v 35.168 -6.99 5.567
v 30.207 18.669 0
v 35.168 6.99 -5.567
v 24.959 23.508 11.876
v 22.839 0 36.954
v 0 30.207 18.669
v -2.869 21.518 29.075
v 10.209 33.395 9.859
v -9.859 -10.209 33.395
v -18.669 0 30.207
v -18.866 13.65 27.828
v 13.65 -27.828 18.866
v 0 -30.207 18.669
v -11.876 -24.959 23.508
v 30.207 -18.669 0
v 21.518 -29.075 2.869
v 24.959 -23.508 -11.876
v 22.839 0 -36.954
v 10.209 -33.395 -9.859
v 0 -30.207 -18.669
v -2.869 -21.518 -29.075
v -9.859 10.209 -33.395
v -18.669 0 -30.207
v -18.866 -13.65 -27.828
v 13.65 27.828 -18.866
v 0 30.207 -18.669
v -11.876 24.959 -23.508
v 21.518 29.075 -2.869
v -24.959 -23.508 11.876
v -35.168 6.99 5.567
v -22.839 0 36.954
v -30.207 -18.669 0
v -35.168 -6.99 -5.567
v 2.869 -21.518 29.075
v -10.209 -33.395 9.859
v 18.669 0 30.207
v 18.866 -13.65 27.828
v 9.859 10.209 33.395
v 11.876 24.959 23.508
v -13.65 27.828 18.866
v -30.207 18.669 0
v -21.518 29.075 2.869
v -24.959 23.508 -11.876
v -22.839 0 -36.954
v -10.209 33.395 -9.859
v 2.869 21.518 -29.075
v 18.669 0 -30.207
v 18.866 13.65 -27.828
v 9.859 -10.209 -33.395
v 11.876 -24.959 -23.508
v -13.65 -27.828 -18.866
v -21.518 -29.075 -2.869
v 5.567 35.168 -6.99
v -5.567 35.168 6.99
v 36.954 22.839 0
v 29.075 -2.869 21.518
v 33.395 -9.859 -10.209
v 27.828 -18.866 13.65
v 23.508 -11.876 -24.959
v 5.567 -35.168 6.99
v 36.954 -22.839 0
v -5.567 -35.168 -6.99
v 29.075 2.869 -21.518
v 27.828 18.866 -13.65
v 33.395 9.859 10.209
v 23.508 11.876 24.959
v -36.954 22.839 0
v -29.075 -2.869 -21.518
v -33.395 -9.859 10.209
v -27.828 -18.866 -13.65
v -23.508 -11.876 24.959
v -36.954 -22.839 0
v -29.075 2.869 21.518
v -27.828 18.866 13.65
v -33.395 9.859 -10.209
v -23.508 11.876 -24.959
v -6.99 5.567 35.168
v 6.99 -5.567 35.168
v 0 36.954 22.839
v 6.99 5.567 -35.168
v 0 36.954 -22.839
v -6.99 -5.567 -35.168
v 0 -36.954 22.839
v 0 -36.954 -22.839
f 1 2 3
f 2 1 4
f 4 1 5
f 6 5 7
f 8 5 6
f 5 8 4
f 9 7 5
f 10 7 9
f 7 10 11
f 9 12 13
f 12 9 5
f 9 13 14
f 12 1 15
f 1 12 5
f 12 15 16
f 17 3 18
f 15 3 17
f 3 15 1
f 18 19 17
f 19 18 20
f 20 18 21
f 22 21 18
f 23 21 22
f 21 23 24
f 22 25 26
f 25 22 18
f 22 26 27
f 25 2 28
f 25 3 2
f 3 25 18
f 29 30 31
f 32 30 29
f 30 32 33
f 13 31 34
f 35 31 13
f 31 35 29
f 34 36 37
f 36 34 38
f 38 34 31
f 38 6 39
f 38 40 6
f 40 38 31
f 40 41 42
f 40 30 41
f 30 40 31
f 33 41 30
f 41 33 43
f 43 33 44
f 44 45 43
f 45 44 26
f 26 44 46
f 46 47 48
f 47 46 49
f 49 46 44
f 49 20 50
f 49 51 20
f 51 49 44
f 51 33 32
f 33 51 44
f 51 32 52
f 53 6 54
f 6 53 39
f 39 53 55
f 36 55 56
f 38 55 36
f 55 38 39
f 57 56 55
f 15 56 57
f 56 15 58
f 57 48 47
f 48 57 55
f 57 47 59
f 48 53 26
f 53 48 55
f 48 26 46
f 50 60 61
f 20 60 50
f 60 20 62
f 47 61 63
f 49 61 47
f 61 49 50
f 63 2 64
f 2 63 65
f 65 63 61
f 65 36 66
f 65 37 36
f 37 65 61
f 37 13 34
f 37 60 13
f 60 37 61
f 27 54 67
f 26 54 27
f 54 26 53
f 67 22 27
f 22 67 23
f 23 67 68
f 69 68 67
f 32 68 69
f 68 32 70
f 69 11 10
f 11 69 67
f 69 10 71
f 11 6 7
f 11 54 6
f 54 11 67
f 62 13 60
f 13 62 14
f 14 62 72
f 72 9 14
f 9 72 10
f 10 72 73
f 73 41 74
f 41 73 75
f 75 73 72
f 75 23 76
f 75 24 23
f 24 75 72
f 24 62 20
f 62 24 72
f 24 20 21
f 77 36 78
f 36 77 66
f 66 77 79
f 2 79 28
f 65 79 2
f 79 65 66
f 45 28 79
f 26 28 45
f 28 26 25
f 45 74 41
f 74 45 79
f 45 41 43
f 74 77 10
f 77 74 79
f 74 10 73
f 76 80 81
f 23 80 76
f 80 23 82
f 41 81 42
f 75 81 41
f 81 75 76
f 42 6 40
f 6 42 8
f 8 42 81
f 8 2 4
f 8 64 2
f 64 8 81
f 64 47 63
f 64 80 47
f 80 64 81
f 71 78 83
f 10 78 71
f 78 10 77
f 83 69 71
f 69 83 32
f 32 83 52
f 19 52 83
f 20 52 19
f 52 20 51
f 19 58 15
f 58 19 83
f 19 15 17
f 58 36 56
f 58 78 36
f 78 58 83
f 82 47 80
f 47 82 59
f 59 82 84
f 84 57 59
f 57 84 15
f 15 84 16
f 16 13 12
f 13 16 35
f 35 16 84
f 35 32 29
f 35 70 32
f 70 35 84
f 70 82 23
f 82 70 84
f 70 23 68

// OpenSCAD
// Medial Pentagonal Hexecontahedron
//   coords via: http://dmccooey.com/polyhedra/MedialPentagonalHexecontahedron.html
//
scaling_factor = 30;

C0  = 0.0956375228054126600288251856007;
C1  = 0.185557856078737208916498067410;
C2  = 0.232983484058011057773884196064;
C3  = 0.3286210068634237178027093816646;
C4  = 0.340302618577738088855453915730;
C5  = 0.395876440820370748493308922286;
C6  = 0.4549836805139589684034395850047;
C7  = 0.622299338042328798044313589880;
C8  = 0.62885992487838180626719311834997;
C9  = 0.717277814600969258425288142552;
C10 = 0.76128814508384772869302314304499;
C11 = 0.783604687377382686206148966669;
C12 = 0.831958876537190137973273811827;
C13 = 0.927596399342602798002098997427;
C14 = 0.969162543456119895122647034080;
C15 = 1.00690148012904844554595434173;
C16 = 1.11315425542134000691859706484;
C17 = 1.17226149511492822682872772756;
C18 = 1.23179009397802679283951773532;

vertices = [
  [ C10,  0.0,  C18], [ C10,  0.0, -C18], [-C10,  0.0,  C18], [-C10,  0.0, -C18],
  [ C18,  C10,  0.0], [ C18, -C10,  0.0], [-C18,  C10,  0.0], [-C18, -C10,  0.0],
  [ 0.0,  C18,  C10], [ 0.0,  C18, -C10], [ 0.0, -C18,  C10], [ 0.0, -C18, -C10],
  [  C2,  -C1,  C17], [  C2,   C1, -C17], [ -C2,   C1,  C17], [ -C2,  -C1, -C17],
  [ C17,  -C2,   C1], [ C17,   C2,  -C1], [-C17,   C2,   C1], [-C17,  -C2,  -C1],
  [  C1, -C17,   C2], [  C1,  C17,  -C2], [ -C1,  C17,   C2], [ -C1, -C17,  -C2],
  [  C3,   C4,  C16], [  C3,  -C4, -C16], [ -C3,  -C4,  C16], [ -C3,   C4, -C16],
  [ C16,   C3,   C4], [ C16,  -C3,  -C4], [-C16,  -C3,   C4], [-C16,   C3,  -C4],
  [  C4,  C16,   C3], [  C4, -C16,  -C3], [ -C4, -C16,   C3], [ -C4,  C16,  -C3],
  [  C7,  0.0,  C15], [  C7,  0.0, -C15], [ -C7,  0.0,  C15], [ -C7,  0.0, -C15],
  [ C15,   C7,  0.0], [ C15,  -C7,  0.0], [-C15,   C7,  0.0], [-C15,  -C7,  0.0],
  [ 0.0,  C15,   C7], [ 0.0,  C15,  -C7], [ 0.0, -C15,   C7], [ 0.0, -C15,  -C7],
  [  C0,  -C9,  C14], [  C0,   C9, -C14], [ -C0,   C9,  C14], [ -C0,  -C9, -C14],
  [ C14,  -C0,   C9], [ C14,   C0,  -C9], [-C14,   C0,   C9], [-C14,  -C0,  -C9],
  [  C9, -C14,   C0], [  C9,  C14,  -C0], [ -C9,  C14,   C0], [ -C9, -C14,  -C0],
  [  C8,  -C6,  C13], [  C8,   C6, -C13], [ -C8,   C6,  C13], [ -C8,  -C6, -C13],
  [ C13,  -C8,   C6], [ C13,   C8,  -C6], [-C13,   C8,   C6], [-C13,  -C8,  -C6],
  [  C6, -C13,   C8], [  C6,  C13,  -C8], [ -C6,  C13,   C8], [ -C6, -C13,  -C8],
  [ C11,   C5,  C12], [ C11,  -C5, -C12], [-C11,  -C5,  C12], [-C11,   C5, -C12],
  [ C12,  C11,   C5], [ C12, -C11,  -C5], [-C12, -C11,   C5], [-C12,  C11,  -C5],
  [  C5,  C12,  C11], [  C5, -C12, -C11], [ -C5, -C12,  C11], [ -C5,  C12, -C11]
];

faces = [
  [ 0, 16, 17, 40, 76], [ 0, 76, 32, 44, 50], [ 0, 50, 62, 38, 26], [ 0, 26, 82, 46, 68], [ 0, 68, 56, 41, 16],
  [ 1, 17, 16, 41, 77], [ 1, 77, 33, 47, 51], [ 1, 51, 63, 39, 27], [ 1, 27, 83, 45, 69], [ 1, 69, 57, 40, 17],
  [ 2, 18, 19, 43, 78], [ 2, 78, 34, 46, 48], [ 2, 48, 60, 36, 24], [ 2, 24, 80, 44, 70], [ 2, 70, 58, 42, 18],
  [ 3, 19, 18, 42, 79], [ 3, 79, 35, 45, 49], [ 3, 49, 61, 37, 25], [ 3, 25, 81, 47, 71], [ 3, 71, 59, 43, 19],
  [ 4, 21, 22, 44, 80], [ 4, 80, 24, 36, 52], [ 4, 52, 64, 41, 29], [ 4, 29, 73, 37, 61], [ 4, 61, 49, 45, 21],
  [ 5, 20, 23, 47, 81], [ 5, 81, 25, 37, 53], [ 5, 53, 65, 40, 28], [ 5, 28, 72, 36, 60], [ 5, 60, 48, 46, 20],
  [ 6, 22, 21, 45, 83], [ 6, 83, 27, 39, 55], [ 6, 55, 67, 43, 30], [ 6, 30, 74, 38, 62], [ 6, 62, 50, 44, 22],
  [ 7, 23, 20, 46, 82], [ 7, 82, 26, 38, 54], [ 7, 54, 66, 42, 31], [ 7, 31, 75, 39, 63], [ 7, 63, 51, 47, 23],
  [ 8, 14, 12, 36, 72], [ 8, 72, 28, 40, 57], [ 8, 57, 69, 45, 35], [ 8, 35, 79, 42, 66], [ 8, 66, 54, 38, 14],
  [ 9, 13, 15, 39, 75], [ 9, 75, 31, 42, 58], [ 9, 58, 70, 44, 32], [ 9, 32, 76, 40, 65], [ 9, 65, 53, 37, 13],
  [10, 12, 14, 38, 74], [10, 74, 30, 43, 59], [10, 59, 71, 47, 33], [10, 33, 77, 41, 64], [10, 64, 52, 36, 12],
  [11, 15, 13, 37, 73], [11, 73, 29, 41, 56], [11, 56, 68, 46, 34], [11, 34, 78, 43, 67], [11, 67, 55, 39, 15]
];

scale(scaling_factor) {
  polyhedron(points=vertices, faces=faces, convexity=20);
};
